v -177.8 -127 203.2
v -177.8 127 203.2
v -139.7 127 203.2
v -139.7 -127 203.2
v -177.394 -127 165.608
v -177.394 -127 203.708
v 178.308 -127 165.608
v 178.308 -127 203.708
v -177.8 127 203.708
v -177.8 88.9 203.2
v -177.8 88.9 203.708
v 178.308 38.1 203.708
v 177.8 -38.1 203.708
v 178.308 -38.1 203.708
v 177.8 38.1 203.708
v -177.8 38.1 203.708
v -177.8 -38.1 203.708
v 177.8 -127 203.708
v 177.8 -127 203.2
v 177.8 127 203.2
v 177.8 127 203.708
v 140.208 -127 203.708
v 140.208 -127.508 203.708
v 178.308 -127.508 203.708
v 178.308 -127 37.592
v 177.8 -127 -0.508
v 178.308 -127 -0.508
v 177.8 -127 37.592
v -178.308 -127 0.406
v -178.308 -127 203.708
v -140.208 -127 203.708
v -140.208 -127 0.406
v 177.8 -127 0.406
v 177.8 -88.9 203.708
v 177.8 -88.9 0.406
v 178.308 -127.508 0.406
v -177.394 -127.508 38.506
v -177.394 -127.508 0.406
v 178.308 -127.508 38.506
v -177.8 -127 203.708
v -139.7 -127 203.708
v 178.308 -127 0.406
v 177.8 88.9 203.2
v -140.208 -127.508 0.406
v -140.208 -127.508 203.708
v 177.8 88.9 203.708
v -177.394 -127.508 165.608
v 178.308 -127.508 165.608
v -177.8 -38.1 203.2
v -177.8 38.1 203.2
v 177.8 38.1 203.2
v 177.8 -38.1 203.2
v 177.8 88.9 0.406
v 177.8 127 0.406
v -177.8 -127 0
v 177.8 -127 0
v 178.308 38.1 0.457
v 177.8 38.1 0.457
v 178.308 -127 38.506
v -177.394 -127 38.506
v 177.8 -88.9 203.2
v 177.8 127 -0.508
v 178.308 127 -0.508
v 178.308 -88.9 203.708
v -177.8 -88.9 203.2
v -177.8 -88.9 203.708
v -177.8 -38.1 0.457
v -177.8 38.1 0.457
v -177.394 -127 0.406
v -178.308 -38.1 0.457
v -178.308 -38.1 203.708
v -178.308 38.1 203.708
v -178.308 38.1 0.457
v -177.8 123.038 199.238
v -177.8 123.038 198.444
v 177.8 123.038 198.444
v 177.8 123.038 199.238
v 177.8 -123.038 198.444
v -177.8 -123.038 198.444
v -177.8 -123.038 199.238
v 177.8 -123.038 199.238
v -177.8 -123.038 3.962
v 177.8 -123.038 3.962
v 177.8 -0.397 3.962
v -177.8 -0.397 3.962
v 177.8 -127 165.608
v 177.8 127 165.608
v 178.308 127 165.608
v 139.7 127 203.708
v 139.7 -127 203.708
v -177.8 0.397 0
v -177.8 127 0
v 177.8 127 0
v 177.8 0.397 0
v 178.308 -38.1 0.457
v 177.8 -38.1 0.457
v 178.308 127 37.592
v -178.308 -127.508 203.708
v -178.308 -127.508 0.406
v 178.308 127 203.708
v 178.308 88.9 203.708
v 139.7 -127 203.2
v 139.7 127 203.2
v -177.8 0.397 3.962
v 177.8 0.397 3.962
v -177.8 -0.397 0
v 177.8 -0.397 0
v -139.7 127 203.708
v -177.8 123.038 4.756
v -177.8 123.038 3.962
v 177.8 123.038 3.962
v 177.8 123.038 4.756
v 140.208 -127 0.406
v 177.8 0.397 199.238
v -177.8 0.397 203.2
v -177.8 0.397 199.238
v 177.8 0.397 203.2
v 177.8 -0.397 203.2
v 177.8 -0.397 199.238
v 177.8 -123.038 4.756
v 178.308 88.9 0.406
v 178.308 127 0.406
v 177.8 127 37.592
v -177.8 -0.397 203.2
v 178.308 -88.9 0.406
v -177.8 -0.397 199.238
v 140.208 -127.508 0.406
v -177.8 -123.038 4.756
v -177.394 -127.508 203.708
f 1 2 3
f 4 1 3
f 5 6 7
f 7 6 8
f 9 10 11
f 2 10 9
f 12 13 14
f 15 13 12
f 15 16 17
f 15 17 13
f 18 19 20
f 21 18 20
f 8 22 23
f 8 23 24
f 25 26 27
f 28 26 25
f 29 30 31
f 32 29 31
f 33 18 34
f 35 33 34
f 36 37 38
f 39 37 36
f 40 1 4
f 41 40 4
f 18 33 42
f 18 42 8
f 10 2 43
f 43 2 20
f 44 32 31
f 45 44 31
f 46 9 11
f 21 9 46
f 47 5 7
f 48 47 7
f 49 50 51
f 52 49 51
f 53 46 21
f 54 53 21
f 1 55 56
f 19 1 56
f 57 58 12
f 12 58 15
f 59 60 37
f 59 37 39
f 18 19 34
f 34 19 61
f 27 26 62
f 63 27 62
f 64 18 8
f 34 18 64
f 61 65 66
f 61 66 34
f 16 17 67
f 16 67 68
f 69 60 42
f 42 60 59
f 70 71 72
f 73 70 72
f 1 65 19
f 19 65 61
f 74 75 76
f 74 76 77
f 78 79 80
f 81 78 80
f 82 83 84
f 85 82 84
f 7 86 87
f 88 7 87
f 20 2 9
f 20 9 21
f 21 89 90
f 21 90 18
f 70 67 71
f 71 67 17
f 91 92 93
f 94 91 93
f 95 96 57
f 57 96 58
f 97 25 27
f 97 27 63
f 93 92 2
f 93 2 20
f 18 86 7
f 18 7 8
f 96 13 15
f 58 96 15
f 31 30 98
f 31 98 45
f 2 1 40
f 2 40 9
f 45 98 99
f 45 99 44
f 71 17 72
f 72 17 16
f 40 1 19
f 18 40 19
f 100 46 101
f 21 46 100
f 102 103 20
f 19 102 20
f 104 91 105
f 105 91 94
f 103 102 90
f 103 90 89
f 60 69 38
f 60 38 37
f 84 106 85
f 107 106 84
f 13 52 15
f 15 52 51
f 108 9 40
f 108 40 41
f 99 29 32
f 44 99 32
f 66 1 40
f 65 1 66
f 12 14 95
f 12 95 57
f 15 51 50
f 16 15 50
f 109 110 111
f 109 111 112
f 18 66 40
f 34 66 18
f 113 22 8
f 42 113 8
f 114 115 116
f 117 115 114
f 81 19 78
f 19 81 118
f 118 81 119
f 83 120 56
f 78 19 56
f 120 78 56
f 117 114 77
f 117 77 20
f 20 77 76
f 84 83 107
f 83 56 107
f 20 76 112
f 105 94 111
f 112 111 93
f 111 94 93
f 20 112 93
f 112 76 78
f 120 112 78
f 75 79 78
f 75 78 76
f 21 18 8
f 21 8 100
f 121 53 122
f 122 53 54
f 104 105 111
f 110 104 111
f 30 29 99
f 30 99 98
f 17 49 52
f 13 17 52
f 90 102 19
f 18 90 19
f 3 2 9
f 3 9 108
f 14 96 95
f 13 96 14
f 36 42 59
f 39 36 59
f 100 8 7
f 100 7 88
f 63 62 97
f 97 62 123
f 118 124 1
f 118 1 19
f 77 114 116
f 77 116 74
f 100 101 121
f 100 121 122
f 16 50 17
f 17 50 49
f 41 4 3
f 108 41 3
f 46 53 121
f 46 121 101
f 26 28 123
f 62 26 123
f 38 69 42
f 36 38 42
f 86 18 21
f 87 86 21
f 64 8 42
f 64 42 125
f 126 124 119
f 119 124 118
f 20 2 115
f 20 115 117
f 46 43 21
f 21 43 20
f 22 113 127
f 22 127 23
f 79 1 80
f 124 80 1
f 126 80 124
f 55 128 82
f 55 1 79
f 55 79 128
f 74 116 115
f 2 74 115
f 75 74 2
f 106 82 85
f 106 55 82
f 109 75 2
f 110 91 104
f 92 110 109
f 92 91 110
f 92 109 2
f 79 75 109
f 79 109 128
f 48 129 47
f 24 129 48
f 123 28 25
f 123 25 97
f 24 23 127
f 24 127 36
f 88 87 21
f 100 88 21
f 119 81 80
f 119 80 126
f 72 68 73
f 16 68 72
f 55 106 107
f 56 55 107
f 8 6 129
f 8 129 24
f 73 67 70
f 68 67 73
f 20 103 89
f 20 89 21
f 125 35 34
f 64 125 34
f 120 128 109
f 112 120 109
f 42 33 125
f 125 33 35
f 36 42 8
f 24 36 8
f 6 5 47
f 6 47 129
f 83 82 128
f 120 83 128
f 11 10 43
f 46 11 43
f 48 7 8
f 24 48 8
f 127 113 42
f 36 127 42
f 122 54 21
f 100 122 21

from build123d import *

# Parameters (mm, degrees)
F0_W      = 355.6
F0_H      = 254
F1_DEPTH  = 203.2
F2_W      = 355.6
F2_H      = 0.79375
F3_DEPTH  = 3.9624
F4_W      = 355.6
F4_H      = 0.79375
F5_DEPTH  = 3.9624
F7_DEPTH  = 0.508
F8_W      = 76.2
F8_H      = 203.2508
F9_DEPTH  = 0.508
F10_W     = 246.0752
F10_H     = 0.79375
F11_DEPTH = 355.601
F12_W     = 355.6
F12_H     = 38.1
F13_DEPTH = 0.508
F14_W     = 38.1
F14_H     = 254
F15_DEPTH = 0.508
F17_W     = 38.1
F17_H     = 203.3016
F18_DEPTH = 0.508
F19_W     = 254
F19_H     = 38.1
F20_DEPTH = 0.508
F21_W     = 355.7016
F21_H     = 38.1
F22_DEPTH = 0.508
F23_W     = 38.1
F23_H     = 203.3016
F24_DEPTH = 0.508


with BuildPart() as f1:
    # F0 (on Top) → F1 (new body)
    with BuildSketch(Plane.XY):
        Rectangle(F0_W, F0_H)
    extrude(amount=F1_DEPTH)

    # F2 (on face) → F3 (cut)
    with BuildSketch(Plane.XY.offset(203.2)):
        Rectangle(F2_W, F2_H)
    extrude(amount=-F3_DEPTH, mode=Mode.SUBTRACT)

    # F4 (on face) → F5 (cut)
    with BuildSketch(Plane(origin=(0, 0, 0), x_dir=(1, 0, 0), z_dir=(0, 0, -1))):
        Rectangle(F4_W, F4_H)
    extrude(amount=-F5_DEPTH, mode=Mode.SUBTRACT)

    # F10 (on face) → F11 (cut, through all)
    with BuildSketch(Plane.YZ.offset(177.8)):
        with Locations((0, 198.840725)):
            Rectangle(F10_W, F10_H)
        with Locations((0, 4.359275)):
            Rectangle(F10_W, F10_H)
    extrude(amount=-F11_DEPTH, mode=Mode.SUBTRACT)


with BuildPart() as f7:
    # F6 (on face) → F7 (new body)
    with BuildSketch(Plane.XY.offset(203.2)):
        Polygon((139.7, -38.1), (177.8, -38.1), (177.8, 38.1), (139.7, 38.1), (-139.7, 38.1), (-177.8, 38.1), (-177.8, -38.1), (-139.7, -38.1), align=None)
    extrude(amount=F7_DEPTH)


with BuildPart() as f9:
    # F8 (on face) → F9 (new body)
    with BuildSketch(Plane.YZ.offset(177.8)):
        with Locations((0, 102.0826)):
            Rectangle(F8_W, F8_H)
    extrude(amount=F9_DEPTH)


with BuildPart() as f13:
    # F12 (on face) → F13 (new body)
    with BuildSketch(Plane.XY.offset(203.2)):
        with Locations((0, -107.95)):
            Rectangle(F12_W, F12_H)
        with Locations((0, 107.95)):
            Rectangle(F12_W, F12_H)
    extrude(amount=F13_DEPTH)


with BuildPart() as f15:
    # F14 (on face) → F15 (new body)
    with BuildSketch(Plane.XY.offset(203.2)):
        with Locations((-158.75, 0)):
            Rectangle(F14_W, F14_H)
        with Locations((158.75, 0)):
            Rectangle(F14_W, F14_H)
    extrude(amount=F15_DEPTH)


with BuildPart() as f16_1:
    # F16: instance of F9
    add(f9.part.mirror(Plane.YZ))


with BuildPart() as f18:
    # F17 (on face) → F18 (new body)
    with BuildSketch(Plane.YZ.offset(177.8)):
        with Locations((-107.95, 102.0572)):
            Rectangle(F17_W, F17_H)
        with Locations((107.95, 102.0572)):
            Rectangle(F17_W, F17_H)
    extrude(amount=F18_DEPTH)


with BuildPart() as f20:
    # F19 (on face) → F20 (new body)
    with BuildSketch(Plane.YZ.offset(177.8)):
        with Locations((0, 184.658)):
            Rectangle(F19_W, F19_H)
        with Locations((0, 18.542)):
            Rectangle(F19_W, F19_H)
    extrude(amount=F20_DEPTH)


with BuildPart() as f22:
    # F21 (on face) → F22 (new body)
    with BuildSketch(Plane.XZ.offset(127)):
        with Locations((0.4572, 184.658)):
            Rectangle(F21_W, F21_H)
        with Locations((0.4572, 19.4564)):
            Rectangle(F21_W, F21_H)
    extrude(amount=F22_DEPTH)


with BuildPart() as f24:
    # F23 (on face) → F24 (new body)
    with BuildSketch(Plane.XZ.offset(127)):
        with Locations((159.258, 102.0572)):
            Rectangle(F23_W, F23_H)
        with Locations((-159.258, 102.0572)):
            Rectangle(F23_W, F23_H)
    extrude(amount=F24_DEPTH)


solid = Compound([f1.part, f7.part, f9.part, f13.part, f15.part, f16_1.part, f18.part, f20.part, f22.part, f24.part])
